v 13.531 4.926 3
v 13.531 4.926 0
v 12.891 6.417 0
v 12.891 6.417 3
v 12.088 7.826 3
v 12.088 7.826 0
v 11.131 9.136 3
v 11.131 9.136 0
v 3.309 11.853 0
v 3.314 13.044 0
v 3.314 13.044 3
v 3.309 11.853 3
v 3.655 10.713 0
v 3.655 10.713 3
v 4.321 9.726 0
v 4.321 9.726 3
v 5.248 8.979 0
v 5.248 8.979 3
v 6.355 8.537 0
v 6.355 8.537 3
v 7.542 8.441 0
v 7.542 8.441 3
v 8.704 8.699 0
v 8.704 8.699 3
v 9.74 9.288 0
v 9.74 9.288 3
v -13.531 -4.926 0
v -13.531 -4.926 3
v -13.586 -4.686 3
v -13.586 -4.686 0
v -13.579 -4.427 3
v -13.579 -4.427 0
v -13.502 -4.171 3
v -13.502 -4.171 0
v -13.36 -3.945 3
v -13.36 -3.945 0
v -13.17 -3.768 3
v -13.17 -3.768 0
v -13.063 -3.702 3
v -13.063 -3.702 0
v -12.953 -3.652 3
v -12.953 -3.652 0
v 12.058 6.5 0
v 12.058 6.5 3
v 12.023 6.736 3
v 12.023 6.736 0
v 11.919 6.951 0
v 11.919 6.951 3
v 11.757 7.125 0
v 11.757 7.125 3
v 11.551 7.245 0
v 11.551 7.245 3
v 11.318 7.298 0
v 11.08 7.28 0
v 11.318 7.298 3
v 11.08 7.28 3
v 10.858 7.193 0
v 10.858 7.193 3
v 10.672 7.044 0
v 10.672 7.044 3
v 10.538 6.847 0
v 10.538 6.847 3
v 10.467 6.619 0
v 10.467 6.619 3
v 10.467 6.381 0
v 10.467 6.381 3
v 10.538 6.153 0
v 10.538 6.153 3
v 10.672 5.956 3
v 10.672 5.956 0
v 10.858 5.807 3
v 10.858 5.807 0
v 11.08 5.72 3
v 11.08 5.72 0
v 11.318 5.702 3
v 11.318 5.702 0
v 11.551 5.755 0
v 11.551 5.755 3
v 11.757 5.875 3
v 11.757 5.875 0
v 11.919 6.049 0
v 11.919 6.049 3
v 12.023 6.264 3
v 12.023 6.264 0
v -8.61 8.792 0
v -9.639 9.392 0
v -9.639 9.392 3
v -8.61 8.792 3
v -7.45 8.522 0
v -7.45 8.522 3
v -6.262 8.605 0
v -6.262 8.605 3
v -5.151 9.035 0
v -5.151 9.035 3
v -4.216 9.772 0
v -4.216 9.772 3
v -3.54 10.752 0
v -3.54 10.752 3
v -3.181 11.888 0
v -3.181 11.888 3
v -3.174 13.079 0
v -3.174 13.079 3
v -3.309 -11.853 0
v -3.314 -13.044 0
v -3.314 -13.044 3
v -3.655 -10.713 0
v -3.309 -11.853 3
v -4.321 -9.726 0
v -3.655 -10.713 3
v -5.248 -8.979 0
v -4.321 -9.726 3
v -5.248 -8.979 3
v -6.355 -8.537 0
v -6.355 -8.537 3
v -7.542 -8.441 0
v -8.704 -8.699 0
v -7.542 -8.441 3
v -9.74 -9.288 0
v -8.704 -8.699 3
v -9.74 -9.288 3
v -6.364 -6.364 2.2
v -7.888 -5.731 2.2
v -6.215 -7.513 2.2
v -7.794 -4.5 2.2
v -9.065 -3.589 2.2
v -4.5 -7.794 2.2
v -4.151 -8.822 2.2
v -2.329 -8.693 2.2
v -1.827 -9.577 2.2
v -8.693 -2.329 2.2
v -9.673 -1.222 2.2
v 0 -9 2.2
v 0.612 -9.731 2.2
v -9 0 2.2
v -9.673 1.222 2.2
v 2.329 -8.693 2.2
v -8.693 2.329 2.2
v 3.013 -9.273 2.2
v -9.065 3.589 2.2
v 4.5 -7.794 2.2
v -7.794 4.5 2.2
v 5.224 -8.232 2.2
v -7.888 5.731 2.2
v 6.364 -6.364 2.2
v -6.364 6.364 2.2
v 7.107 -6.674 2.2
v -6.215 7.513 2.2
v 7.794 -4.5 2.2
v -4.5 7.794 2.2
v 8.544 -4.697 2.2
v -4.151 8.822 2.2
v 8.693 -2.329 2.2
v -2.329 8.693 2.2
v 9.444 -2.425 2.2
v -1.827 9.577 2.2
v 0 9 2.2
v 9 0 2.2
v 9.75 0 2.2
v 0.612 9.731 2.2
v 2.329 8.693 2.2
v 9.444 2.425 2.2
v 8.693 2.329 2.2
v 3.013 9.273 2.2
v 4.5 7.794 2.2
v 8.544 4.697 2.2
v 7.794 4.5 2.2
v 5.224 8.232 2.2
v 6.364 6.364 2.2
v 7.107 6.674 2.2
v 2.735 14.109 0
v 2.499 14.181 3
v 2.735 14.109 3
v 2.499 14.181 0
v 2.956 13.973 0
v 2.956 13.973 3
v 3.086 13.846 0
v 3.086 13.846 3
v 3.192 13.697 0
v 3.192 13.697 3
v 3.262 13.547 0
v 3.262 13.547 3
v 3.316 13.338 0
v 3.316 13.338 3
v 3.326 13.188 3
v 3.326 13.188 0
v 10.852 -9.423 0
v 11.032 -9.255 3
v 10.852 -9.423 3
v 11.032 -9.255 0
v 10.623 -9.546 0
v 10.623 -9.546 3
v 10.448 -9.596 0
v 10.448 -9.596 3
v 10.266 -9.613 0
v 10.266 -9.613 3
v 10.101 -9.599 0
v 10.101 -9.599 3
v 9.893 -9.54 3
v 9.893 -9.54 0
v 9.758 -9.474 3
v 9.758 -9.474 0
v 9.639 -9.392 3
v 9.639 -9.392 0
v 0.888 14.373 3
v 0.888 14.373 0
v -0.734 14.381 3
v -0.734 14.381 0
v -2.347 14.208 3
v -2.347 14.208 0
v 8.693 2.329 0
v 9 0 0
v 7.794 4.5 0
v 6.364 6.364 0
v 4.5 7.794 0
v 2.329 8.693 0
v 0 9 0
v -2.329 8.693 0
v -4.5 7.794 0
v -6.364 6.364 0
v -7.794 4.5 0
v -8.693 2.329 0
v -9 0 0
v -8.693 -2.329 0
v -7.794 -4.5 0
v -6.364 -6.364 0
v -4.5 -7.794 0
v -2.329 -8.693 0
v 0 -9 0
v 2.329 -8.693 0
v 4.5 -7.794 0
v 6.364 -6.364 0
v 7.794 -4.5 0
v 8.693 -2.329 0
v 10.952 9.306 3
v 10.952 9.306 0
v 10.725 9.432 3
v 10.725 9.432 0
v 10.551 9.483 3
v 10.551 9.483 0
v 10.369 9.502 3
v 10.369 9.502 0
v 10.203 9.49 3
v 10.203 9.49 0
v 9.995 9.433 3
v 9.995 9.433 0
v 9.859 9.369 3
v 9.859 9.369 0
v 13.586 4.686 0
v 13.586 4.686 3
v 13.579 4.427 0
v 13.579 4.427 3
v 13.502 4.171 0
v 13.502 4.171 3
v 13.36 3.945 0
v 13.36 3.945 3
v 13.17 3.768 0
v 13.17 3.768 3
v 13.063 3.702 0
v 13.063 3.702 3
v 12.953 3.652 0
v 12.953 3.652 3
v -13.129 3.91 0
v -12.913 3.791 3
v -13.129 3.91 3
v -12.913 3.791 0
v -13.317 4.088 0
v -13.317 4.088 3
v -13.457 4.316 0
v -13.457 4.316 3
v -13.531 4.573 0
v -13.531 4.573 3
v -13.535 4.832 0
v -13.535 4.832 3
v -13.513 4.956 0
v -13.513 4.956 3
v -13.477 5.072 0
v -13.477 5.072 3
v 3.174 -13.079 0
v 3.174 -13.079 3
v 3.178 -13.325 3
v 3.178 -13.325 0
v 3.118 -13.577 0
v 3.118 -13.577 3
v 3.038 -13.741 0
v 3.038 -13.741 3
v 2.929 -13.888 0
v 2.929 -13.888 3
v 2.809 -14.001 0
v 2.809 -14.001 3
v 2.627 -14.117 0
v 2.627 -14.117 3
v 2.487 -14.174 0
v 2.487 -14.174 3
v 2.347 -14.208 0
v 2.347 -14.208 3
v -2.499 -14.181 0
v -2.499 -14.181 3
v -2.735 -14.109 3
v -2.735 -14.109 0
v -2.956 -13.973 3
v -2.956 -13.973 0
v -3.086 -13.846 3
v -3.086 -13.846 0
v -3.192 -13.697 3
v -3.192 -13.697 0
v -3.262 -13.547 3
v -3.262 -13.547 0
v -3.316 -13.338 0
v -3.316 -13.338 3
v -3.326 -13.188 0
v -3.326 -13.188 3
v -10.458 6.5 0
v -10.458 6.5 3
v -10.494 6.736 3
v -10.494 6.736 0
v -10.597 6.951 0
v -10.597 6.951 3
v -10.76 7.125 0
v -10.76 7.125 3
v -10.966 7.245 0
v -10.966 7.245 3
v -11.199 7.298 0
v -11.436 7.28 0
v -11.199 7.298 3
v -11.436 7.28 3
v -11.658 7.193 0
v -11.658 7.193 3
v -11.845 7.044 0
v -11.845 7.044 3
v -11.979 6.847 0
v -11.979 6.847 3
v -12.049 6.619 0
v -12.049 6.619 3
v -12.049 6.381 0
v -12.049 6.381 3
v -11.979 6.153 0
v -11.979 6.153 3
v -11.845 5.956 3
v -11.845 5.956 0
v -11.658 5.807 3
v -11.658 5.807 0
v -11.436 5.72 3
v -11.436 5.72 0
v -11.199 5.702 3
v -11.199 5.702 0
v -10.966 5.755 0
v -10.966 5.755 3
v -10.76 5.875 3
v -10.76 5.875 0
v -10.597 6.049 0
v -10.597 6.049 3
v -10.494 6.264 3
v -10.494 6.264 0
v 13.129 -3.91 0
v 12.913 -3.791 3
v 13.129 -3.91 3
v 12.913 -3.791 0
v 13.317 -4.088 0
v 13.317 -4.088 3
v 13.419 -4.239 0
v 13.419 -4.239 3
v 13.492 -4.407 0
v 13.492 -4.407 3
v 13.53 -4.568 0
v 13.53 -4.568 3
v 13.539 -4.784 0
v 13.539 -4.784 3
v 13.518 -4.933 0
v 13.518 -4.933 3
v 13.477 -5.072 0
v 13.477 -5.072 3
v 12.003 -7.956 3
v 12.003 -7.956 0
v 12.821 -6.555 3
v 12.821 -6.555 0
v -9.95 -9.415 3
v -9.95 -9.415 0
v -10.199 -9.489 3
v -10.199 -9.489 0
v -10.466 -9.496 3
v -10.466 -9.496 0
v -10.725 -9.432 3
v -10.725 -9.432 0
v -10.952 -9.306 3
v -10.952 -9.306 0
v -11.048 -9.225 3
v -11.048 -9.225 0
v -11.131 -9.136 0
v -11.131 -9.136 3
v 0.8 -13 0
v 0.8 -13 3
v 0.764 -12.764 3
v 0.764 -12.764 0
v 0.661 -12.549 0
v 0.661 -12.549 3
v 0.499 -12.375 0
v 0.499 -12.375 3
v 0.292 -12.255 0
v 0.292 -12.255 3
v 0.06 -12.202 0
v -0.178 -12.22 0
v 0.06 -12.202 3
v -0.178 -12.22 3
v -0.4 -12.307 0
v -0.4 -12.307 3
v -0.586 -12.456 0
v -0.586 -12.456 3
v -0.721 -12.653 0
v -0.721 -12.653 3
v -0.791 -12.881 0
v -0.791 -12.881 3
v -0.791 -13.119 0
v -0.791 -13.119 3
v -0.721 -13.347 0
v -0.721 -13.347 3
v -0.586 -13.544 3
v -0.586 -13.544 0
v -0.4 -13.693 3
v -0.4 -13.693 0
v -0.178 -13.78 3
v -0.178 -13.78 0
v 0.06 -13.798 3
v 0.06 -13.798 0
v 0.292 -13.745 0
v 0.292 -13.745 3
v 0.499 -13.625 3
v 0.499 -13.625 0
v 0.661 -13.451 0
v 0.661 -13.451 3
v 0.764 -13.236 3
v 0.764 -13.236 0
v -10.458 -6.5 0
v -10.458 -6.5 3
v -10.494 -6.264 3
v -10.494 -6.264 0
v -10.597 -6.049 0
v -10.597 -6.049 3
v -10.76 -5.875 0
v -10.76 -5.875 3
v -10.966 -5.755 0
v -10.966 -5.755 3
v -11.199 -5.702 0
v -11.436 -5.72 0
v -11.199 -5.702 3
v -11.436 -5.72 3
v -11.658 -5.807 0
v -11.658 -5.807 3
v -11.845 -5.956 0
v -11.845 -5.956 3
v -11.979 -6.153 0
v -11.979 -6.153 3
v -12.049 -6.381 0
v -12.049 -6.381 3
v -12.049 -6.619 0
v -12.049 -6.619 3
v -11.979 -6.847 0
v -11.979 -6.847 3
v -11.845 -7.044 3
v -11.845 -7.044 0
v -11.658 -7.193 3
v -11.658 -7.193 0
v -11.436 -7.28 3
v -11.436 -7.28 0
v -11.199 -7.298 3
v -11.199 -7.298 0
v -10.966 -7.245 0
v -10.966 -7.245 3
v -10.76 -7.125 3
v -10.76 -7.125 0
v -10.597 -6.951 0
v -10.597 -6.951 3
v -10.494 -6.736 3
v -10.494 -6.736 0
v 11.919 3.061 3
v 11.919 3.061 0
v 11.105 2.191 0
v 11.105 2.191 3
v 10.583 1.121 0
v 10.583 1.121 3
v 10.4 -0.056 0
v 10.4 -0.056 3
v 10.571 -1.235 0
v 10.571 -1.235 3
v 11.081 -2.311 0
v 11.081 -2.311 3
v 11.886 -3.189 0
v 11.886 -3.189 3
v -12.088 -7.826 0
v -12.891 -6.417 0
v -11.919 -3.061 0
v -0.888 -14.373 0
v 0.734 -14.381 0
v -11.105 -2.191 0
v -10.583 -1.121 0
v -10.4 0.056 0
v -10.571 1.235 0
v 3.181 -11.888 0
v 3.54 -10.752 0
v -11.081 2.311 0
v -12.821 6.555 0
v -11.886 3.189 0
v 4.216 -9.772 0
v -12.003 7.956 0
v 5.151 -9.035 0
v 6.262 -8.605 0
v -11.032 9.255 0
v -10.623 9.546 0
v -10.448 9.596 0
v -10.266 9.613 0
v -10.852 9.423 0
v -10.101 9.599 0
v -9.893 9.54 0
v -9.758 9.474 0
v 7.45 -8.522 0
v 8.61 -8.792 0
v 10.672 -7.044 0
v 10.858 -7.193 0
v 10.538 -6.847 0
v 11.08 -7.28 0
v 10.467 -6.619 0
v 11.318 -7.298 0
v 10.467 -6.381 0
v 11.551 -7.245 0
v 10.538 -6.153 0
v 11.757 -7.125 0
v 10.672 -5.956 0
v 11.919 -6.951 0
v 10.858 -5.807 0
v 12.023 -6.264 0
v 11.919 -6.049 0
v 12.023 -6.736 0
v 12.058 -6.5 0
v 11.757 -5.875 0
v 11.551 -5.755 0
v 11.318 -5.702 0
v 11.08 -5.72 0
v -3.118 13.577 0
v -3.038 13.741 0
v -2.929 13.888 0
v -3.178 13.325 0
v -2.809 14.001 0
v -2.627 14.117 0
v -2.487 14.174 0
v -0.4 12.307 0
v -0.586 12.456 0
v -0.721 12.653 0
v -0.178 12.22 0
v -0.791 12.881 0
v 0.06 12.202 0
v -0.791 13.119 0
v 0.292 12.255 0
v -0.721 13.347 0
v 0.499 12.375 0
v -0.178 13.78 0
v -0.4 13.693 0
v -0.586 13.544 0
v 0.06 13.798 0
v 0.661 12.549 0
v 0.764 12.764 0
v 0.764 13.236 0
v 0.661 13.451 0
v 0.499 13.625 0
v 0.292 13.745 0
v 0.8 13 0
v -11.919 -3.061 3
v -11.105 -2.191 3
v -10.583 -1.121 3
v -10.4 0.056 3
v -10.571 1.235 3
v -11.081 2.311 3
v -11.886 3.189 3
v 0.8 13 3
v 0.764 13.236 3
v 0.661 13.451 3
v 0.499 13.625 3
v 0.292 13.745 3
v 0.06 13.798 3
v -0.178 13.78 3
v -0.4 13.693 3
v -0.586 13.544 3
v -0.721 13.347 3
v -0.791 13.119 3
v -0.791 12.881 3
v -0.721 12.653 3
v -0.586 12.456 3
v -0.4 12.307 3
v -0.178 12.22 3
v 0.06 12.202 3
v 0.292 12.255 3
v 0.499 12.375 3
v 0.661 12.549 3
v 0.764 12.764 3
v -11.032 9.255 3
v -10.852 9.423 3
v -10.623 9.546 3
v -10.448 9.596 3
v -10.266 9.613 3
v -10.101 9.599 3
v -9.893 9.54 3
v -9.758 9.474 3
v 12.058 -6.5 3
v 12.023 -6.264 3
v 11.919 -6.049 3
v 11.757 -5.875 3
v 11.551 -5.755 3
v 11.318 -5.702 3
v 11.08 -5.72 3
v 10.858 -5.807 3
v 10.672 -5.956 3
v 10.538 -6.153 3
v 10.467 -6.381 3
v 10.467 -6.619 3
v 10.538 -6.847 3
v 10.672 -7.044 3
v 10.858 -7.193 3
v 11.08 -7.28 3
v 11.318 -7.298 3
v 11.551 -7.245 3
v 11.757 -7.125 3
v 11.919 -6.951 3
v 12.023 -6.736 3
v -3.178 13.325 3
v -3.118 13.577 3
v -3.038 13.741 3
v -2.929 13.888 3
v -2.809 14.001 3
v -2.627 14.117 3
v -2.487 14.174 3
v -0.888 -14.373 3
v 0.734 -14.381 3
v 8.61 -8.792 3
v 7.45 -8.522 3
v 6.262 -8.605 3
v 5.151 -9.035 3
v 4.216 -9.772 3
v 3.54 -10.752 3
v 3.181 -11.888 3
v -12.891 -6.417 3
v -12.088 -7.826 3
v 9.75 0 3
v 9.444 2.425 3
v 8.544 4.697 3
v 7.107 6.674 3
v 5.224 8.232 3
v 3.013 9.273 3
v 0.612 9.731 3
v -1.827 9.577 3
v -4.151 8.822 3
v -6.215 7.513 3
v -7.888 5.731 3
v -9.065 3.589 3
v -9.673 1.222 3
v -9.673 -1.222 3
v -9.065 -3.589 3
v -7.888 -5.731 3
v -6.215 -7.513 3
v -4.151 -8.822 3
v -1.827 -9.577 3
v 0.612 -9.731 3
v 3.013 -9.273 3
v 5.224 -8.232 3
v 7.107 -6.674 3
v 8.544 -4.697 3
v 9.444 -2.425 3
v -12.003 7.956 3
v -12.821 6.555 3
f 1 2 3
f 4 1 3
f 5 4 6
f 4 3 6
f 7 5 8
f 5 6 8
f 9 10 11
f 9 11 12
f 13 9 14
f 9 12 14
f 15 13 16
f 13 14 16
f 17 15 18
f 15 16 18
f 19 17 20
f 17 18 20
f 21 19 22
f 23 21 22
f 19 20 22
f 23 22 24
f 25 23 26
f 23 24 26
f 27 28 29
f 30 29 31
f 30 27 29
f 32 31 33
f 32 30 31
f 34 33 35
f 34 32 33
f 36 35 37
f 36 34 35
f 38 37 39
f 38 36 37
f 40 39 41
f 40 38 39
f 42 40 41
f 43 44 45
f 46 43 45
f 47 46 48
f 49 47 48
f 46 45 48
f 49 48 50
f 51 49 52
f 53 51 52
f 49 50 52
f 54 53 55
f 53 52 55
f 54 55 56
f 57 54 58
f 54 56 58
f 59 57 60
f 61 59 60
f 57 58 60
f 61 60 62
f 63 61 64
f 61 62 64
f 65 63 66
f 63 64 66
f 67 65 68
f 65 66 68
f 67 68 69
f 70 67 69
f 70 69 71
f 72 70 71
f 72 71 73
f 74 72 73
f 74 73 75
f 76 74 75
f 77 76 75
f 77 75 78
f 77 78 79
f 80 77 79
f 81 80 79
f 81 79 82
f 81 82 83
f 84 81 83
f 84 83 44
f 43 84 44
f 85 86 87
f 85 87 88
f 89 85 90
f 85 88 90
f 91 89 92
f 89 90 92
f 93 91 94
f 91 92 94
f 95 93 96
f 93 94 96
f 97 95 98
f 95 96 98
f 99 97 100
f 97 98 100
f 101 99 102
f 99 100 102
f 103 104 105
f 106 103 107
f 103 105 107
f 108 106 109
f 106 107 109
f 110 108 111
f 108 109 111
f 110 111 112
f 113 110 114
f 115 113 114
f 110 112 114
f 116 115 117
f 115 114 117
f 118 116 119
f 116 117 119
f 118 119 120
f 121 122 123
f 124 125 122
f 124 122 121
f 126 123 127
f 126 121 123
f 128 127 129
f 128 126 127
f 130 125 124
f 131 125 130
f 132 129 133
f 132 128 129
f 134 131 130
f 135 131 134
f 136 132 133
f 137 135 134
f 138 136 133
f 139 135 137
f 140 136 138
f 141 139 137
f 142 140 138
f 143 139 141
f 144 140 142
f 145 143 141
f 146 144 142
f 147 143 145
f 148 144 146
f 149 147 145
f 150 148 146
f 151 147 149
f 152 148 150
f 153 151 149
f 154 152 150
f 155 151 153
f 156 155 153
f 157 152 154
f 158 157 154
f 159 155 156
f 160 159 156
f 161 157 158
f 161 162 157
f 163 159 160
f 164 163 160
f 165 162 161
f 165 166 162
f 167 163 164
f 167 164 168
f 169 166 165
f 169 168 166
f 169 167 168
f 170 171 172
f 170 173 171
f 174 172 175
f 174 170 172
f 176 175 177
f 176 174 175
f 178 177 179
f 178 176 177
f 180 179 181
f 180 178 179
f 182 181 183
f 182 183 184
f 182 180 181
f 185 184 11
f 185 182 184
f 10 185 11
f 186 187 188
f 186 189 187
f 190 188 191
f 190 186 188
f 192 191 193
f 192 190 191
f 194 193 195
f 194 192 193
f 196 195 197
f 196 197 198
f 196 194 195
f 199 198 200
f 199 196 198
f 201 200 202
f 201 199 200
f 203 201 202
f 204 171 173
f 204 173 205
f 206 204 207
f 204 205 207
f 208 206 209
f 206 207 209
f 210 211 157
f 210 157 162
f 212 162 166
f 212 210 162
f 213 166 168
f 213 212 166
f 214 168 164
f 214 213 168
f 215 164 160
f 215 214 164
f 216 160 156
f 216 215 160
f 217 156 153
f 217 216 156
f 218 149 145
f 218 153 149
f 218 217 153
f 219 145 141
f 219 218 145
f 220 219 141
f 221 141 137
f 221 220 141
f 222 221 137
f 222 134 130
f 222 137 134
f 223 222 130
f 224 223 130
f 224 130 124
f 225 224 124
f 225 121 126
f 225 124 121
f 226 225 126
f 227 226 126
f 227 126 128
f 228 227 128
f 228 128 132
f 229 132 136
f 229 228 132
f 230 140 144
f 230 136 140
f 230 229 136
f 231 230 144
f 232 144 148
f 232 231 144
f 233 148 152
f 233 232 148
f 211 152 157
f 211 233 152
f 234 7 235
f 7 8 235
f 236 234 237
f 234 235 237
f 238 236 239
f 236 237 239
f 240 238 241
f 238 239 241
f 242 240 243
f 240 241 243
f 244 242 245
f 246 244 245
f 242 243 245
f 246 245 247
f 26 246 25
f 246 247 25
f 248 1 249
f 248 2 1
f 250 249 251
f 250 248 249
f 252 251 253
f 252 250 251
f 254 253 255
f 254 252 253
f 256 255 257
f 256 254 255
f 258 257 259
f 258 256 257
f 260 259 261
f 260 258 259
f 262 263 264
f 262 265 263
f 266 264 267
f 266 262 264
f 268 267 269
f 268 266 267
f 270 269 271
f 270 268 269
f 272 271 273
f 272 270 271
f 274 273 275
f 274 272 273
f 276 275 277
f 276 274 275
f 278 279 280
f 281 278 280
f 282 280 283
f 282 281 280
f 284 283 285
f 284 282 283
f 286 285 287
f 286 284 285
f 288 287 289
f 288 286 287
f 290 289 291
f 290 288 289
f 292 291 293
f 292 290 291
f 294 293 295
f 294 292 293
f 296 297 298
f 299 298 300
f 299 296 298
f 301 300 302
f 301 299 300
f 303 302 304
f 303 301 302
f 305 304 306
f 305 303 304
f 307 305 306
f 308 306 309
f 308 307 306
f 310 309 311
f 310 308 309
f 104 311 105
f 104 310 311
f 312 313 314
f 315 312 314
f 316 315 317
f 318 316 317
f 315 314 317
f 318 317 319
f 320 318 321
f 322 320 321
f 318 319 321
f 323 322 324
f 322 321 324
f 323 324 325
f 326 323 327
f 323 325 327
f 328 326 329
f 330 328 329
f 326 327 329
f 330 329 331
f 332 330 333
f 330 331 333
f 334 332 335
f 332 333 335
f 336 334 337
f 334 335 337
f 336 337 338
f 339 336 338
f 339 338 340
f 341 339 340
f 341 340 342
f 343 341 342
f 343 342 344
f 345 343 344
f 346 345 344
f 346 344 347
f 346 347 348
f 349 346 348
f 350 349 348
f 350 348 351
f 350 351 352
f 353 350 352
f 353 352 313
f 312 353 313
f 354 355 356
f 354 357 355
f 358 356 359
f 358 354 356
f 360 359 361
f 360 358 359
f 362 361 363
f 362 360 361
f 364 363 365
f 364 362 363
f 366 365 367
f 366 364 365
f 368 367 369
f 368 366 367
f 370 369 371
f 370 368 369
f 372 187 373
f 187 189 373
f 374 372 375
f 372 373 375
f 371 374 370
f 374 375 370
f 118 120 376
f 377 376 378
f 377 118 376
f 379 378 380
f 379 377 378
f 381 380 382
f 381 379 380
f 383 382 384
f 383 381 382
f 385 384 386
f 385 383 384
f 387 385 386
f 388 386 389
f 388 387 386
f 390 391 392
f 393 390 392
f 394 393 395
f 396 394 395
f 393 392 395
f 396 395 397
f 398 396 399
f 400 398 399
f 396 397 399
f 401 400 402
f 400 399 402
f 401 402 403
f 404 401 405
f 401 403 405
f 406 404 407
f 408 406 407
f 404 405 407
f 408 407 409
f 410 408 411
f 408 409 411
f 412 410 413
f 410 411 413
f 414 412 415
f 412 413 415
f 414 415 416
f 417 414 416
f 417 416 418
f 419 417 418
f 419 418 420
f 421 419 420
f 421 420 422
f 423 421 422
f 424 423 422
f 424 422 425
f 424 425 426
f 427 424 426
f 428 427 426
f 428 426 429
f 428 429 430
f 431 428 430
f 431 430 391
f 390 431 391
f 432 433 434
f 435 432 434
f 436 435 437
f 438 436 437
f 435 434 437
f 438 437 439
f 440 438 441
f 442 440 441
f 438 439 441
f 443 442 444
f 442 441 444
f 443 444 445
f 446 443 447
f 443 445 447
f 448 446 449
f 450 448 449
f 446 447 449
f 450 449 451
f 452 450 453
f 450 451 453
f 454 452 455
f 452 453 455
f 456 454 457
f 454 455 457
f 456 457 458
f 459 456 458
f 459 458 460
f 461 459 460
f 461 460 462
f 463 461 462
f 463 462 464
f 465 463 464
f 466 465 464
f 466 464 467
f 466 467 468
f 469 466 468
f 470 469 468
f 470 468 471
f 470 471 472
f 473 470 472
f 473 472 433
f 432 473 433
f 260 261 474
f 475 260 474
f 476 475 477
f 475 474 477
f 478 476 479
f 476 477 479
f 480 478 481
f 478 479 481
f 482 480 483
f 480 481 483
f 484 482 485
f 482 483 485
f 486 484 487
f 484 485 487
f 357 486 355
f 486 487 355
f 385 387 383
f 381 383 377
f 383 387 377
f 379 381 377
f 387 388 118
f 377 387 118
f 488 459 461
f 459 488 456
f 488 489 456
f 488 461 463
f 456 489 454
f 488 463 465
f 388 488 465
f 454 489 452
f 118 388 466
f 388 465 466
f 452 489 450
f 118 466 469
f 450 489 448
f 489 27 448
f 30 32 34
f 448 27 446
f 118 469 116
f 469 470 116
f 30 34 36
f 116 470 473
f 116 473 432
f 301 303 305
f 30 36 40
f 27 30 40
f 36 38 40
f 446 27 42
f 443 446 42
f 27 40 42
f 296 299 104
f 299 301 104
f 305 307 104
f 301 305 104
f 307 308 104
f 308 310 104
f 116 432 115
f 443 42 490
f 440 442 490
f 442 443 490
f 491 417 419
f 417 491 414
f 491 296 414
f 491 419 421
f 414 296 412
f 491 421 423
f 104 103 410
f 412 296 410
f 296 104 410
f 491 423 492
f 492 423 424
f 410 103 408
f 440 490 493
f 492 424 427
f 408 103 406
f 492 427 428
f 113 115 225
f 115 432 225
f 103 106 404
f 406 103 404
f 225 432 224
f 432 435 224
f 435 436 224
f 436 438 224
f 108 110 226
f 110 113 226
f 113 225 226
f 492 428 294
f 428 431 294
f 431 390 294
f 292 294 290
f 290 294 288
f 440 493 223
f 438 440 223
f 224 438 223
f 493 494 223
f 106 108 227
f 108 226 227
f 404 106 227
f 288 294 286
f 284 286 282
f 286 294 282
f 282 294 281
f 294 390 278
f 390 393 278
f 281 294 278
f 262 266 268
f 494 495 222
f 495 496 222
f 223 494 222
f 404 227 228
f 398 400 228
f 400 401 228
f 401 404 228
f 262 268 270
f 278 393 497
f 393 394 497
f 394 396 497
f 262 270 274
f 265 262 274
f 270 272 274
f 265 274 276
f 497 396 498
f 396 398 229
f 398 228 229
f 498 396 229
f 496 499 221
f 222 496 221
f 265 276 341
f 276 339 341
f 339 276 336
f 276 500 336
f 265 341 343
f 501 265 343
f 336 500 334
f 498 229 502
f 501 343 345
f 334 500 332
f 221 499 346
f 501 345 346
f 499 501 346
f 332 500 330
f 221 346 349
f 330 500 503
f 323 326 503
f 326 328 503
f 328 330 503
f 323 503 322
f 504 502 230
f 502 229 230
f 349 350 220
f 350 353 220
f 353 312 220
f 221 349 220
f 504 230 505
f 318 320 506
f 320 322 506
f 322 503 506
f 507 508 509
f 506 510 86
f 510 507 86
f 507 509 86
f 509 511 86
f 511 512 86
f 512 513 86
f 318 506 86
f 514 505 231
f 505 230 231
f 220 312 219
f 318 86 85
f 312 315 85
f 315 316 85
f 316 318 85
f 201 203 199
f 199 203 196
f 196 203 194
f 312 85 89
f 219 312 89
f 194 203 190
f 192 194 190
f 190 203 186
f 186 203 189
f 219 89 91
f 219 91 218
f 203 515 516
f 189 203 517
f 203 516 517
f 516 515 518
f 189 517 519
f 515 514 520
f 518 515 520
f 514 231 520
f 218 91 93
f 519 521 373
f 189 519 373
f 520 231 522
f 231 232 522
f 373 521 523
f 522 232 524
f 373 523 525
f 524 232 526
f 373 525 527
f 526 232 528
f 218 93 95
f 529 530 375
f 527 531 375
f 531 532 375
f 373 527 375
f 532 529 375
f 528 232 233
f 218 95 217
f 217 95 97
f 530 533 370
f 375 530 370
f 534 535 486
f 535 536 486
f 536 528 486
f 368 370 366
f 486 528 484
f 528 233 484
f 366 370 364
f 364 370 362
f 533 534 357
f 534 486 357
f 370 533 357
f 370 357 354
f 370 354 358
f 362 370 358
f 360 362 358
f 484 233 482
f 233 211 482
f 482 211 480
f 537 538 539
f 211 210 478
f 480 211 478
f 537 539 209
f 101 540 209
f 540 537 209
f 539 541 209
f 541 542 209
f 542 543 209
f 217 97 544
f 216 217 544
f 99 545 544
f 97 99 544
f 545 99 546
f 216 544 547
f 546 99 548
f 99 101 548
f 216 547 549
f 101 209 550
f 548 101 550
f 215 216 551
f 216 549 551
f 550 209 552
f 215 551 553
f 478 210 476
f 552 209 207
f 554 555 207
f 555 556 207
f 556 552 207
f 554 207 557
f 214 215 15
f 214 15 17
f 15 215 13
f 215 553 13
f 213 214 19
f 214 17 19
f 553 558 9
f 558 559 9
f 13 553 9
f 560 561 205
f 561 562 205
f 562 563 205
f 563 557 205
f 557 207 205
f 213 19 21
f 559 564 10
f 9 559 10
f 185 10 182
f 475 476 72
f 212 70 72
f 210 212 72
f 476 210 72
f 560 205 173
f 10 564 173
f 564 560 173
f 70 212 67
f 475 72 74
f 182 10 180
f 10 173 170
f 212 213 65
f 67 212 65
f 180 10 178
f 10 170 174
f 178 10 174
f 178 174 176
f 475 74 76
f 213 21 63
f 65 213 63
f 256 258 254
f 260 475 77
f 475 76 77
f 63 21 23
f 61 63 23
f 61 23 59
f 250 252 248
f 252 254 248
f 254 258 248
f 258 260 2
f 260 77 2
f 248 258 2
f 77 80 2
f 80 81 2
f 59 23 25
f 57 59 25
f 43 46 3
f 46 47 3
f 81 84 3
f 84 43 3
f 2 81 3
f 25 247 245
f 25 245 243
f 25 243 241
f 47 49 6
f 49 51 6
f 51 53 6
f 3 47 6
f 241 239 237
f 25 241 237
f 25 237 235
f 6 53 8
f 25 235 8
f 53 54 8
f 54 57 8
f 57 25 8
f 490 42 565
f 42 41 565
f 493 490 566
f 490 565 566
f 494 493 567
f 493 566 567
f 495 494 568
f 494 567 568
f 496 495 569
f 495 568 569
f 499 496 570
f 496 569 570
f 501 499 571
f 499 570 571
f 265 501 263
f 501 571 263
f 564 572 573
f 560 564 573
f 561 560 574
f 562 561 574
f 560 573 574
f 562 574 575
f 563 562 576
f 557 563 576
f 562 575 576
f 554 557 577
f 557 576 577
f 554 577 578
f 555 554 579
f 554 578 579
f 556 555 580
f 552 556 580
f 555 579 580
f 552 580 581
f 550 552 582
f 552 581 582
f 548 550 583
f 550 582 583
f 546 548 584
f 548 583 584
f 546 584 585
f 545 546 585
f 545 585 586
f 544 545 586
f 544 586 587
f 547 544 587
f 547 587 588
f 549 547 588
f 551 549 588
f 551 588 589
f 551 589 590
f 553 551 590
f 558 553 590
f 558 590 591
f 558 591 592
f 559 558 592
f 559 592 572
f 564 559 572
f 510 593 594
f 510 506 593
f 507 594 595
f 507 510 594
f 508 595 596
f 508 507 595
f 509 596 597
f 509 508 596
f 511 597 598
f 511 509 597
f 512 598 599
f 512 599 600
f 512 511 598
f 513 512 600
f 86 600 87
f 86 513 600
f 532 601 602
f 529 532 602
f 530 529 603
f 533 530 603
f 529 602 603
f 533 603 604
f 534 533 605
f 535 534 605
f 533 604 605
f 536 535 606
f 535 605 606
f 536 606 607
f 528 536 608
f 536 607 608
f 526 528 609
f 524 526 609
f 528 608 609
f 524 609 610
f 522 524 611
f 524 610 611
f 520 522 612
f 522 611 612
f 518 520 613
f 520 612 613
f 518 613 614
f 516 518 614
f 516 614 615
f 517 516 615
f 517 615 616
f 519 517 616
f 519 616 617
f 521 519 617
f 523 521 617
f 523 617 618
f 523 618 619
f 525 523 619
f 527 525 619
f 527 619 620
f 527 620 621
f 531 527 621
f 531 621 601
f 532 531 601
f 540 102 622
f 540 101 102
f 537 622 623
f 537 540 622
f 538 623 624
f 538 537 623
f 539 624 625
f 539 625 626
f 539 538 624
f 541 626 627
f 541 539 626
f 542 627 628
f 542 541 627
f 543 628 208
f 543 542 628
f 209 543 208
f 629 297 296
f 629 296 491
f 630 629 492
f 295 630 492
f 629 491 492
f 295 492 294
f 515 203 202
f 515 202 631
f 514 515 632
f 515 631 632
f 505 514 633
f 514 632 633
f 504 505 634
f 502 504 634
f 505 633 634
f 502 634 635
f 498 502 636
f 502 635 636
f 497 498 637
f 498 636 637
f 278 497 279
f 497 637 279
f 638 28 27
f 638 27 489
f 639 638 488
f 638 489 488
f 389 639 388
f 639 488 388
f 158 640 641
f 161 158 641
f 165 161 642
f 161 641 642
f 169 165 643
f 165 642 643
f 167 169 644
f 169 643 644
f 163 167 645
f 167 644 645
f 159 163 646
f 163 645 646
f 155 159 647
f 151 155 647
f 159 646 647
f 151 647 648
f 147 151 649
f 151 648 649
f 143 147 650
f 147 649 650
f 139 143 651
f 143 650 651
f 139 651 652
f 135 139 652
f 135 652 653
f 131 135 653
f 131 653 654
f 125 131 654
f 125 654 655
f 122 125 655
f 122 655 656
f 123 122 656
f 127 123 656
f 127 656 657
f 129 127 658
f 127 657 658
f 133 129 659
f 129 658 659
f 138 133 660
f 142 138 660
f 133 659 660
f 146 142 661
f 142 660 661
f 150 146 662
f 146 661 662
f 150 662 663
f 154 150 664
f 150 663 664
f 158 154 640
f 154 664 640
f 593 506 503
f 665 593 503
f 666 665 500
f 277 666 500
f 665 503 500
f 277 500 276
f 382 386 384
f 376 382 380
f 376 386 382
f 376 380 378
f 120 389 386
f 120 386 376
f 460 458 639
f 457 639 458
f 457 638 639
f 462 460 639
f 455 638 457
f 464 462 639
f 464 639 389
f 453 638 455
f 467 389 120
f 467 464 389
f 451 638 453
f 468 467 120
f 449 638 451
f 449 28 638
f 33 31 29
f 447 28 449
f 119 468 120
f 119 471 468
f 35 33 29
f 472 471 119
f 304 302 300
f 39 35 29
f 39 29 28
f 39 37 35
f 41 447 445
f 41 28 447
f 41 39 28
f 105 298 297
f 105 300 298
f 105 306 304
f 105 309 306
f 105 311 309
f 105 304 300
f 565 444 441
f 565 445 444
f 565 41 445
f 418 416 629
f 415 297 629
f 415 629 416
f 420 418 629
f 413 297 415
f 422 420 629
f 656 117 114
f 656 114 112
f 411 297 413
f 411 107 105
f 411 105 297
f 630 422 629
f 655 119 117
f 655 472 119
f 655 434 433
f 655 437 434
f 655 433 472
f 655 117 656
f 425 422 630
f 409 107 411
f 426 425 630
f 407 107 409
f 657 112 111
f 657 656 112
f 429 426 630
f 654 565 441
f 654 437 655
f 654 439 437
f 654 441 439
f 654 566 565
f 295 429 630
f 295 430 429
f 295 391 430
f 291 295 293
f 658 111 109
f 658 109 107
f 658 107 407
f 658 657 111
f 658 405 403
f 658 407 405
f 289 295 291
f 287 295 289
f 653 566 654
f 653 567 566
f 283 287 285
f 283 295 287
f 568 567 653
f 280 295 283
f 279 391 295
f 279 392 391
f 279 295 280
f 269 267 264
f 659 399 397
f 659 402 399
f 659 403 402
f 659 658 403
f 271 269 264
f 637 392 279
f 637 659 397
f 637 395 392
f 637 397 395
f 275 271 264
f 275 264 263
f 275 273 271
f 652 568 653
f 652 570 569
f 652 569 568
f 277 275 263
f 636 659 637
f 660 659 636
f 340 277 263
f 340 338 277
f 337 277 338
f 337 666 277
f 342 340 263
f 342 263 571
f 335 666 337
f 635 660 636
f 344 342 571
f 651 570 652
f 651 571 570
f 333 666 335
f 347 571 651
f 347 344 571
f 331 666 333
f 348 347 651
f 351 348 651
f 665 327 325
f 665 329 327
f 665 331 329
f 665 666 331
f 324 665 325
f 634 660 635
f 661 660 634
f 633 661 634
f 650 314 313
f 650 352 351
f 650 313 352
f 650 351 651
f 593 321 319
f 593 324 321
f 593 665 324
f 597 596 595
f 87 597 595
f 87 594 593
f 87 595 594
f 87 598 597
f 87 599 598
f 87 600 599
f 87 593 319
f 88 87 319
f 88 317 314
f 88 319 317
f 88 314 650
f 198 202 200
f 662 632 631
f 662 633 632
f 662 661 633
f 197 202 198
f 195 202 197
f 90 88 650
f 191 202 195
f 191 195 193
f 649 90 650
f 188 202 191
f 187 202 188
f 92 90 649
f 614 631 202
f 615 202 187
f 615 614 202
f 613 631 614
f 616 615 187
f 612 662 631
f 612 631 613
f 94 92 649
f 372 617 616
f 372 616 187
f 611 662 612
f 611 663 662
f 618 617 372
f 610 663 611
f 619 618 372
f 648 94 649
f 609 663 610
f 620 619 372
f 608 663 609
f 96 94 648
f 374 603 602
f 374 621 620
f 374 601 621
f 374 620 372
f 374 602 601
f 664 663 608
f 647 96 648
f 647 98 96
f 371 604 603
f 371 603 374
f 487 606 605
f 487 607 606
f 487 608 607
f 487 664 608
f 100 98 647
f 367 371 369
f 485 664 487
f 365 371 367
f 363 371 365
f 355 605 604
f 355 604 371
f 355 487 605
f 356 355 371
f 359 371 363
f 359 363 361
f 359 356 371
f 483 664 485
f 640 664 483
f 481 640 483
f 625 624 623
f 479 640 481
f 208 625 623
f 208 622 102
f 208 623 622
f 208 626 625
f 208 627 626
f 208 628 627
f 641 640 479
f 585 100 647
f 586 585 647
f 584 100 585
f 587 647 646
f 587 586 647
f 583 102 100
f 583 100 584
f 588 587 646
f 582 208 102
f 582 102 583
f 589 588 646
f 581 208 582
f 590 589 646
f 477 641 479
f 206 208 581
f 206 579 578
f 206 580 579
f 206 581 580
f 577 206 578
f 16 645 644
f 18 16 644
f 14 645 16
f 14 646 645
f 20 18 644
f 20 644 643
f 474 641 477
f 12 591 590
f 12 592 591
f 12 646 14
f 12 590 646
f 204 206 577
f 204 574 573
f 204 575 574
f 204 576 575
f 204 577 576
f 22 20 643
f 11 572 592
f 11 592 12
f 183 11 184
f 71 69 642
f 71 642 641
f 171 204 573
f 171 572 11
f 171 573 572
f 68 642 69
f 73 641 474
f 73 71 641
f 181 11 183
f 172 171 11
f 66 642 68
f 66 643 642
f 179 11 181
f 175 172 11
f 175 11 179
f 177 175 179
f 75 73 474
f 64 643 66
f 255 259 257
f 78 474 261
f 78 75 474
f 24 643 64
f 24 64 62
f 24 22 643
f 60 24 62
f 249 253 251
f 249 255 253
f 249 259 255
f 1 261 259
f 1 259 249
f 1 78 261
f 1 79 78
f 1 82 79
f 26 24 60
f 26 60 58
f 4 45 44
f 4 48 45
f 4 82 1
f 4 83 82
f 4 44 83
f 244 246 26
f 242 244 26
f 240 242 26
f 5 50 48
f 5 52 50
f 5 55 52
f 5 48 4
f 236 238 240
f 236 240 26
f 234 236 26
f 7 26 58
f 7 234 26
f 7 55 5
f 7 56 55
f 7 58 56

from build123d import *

# Parameters (mm, degrees)
SKETCH_1_R          = 14.4
SKETCH_1_R_2        = 9
EXTRUDE_1_DEPTH     = 3
SKETCH_2_R          = 9.75
CUT_EXTRUDE_1_DEPTH = 0.8
SKETCH_3_R          = 0.8
CUT_EXTRUDE_2_DEPTH = 10
SKETCH_4_R          = 4
CUT_EXTRUDE_3_DEPTH = 10
FILLET_1_R          = 1


with BuildPart() as part:
    # 草图1 → 凸台-拉伸1 (new body)
    with BuildSketch(Plane.XY):
        Circle(SKETCH_1_R)
        Circle(SKETCH_1_R_2, mode=Mode.SUBTRACT)
    extrude(amount=EXTRUDE_1_DEPTH)

    # 草图2 → 切除-拉伸1 (cut)
    with BuildSketch(Plane.XY.offset(3)):
        Circle(SKETCH_2_R)
    extrude(amount=-CUT_EXTRUDE_1_DEPTH, mode=Mode.SUBTRACT)

    # 草图3 → 切除-拉伸2 (cut)
    with BuildSketch(Plane.XY.offset(3)):
        with Locations((0, 13)):
            Circle(SKETCH_3_R)
        with Locations((11.258330249, 6.5)):
            Circle(SKETCH_3_R)
        with Locations((11.258330249, -6.5)):
            Circle(SKETCH_3_R)
        with Locations((0, -13)):
            Circle(SKETCH_3_R)
        with Locations((-11.258330249, -6.5)):
            Circle(SKETCH_3_R)
        with Locations((-11.258330249, 6.5)):
            Circle(SKETCH_3_R)
    extrude(amount=-CUT_EXTRUDE_2_DEPTH, mode=Mode.SUBTRACT)

    # 草图4 → 切除-拉伸3 (cut)
    with BuildSketch(Plane.XY.offset(3)):
        with Locations((7.267001819, 12.431841559)):
            Circle(SKETCH_4_R)
        with Locations((14.399791516, -0.077487405)):
            Circle(SKETCH_4_R)
        with Locations((7.132789697, -12.509328965)):
            Circle(SKETCH_4_R)
        with Locations((-7.267001819, -12.431841559)):
            Circle(SKETCH_4_R)
        with Locations((-14.399791516, 0.077487405)):
            Circle(SKETCH_4_R)
        with Locations((-7.132789697, 12.509328965)):
            Circle(SKETCH_4_R)
    extrude(amount=-CUT_EXTRUDE_3_DEPTH, mode=Mode.SUBTRACT)

    # 圆角1
    fillet_1_edges = [part.edges().sort_by_distance(p)[0] for p in [
        (3.566819155, 13.951265216, 1.5),
        (10.406459035, 9.953170869, 1.5),
        (13.865559669, 3.886676609, 1.5),
        (13.822928338, -4.035672453, 1.5),
        (10.298740514, -10.064588606, 1.5),
        (3.416469303, -13.988843322, 1.5),
        (-3.566819155, -13.951265216, 1.5),
        (-10.406459035, -9.953170869, 1.5),
        (-13.865559669, -3.886676609, 1.5),
        (-13.822928338, 4.035672453, 1.5),
        (-10.298740514, 10.064588606, 1.5),
        (-3.416469303, 13.988843322, 1.5),
    ]]
    fillet(fillet_1_edges, radius=FILLET_1_R)


solid = part.part
